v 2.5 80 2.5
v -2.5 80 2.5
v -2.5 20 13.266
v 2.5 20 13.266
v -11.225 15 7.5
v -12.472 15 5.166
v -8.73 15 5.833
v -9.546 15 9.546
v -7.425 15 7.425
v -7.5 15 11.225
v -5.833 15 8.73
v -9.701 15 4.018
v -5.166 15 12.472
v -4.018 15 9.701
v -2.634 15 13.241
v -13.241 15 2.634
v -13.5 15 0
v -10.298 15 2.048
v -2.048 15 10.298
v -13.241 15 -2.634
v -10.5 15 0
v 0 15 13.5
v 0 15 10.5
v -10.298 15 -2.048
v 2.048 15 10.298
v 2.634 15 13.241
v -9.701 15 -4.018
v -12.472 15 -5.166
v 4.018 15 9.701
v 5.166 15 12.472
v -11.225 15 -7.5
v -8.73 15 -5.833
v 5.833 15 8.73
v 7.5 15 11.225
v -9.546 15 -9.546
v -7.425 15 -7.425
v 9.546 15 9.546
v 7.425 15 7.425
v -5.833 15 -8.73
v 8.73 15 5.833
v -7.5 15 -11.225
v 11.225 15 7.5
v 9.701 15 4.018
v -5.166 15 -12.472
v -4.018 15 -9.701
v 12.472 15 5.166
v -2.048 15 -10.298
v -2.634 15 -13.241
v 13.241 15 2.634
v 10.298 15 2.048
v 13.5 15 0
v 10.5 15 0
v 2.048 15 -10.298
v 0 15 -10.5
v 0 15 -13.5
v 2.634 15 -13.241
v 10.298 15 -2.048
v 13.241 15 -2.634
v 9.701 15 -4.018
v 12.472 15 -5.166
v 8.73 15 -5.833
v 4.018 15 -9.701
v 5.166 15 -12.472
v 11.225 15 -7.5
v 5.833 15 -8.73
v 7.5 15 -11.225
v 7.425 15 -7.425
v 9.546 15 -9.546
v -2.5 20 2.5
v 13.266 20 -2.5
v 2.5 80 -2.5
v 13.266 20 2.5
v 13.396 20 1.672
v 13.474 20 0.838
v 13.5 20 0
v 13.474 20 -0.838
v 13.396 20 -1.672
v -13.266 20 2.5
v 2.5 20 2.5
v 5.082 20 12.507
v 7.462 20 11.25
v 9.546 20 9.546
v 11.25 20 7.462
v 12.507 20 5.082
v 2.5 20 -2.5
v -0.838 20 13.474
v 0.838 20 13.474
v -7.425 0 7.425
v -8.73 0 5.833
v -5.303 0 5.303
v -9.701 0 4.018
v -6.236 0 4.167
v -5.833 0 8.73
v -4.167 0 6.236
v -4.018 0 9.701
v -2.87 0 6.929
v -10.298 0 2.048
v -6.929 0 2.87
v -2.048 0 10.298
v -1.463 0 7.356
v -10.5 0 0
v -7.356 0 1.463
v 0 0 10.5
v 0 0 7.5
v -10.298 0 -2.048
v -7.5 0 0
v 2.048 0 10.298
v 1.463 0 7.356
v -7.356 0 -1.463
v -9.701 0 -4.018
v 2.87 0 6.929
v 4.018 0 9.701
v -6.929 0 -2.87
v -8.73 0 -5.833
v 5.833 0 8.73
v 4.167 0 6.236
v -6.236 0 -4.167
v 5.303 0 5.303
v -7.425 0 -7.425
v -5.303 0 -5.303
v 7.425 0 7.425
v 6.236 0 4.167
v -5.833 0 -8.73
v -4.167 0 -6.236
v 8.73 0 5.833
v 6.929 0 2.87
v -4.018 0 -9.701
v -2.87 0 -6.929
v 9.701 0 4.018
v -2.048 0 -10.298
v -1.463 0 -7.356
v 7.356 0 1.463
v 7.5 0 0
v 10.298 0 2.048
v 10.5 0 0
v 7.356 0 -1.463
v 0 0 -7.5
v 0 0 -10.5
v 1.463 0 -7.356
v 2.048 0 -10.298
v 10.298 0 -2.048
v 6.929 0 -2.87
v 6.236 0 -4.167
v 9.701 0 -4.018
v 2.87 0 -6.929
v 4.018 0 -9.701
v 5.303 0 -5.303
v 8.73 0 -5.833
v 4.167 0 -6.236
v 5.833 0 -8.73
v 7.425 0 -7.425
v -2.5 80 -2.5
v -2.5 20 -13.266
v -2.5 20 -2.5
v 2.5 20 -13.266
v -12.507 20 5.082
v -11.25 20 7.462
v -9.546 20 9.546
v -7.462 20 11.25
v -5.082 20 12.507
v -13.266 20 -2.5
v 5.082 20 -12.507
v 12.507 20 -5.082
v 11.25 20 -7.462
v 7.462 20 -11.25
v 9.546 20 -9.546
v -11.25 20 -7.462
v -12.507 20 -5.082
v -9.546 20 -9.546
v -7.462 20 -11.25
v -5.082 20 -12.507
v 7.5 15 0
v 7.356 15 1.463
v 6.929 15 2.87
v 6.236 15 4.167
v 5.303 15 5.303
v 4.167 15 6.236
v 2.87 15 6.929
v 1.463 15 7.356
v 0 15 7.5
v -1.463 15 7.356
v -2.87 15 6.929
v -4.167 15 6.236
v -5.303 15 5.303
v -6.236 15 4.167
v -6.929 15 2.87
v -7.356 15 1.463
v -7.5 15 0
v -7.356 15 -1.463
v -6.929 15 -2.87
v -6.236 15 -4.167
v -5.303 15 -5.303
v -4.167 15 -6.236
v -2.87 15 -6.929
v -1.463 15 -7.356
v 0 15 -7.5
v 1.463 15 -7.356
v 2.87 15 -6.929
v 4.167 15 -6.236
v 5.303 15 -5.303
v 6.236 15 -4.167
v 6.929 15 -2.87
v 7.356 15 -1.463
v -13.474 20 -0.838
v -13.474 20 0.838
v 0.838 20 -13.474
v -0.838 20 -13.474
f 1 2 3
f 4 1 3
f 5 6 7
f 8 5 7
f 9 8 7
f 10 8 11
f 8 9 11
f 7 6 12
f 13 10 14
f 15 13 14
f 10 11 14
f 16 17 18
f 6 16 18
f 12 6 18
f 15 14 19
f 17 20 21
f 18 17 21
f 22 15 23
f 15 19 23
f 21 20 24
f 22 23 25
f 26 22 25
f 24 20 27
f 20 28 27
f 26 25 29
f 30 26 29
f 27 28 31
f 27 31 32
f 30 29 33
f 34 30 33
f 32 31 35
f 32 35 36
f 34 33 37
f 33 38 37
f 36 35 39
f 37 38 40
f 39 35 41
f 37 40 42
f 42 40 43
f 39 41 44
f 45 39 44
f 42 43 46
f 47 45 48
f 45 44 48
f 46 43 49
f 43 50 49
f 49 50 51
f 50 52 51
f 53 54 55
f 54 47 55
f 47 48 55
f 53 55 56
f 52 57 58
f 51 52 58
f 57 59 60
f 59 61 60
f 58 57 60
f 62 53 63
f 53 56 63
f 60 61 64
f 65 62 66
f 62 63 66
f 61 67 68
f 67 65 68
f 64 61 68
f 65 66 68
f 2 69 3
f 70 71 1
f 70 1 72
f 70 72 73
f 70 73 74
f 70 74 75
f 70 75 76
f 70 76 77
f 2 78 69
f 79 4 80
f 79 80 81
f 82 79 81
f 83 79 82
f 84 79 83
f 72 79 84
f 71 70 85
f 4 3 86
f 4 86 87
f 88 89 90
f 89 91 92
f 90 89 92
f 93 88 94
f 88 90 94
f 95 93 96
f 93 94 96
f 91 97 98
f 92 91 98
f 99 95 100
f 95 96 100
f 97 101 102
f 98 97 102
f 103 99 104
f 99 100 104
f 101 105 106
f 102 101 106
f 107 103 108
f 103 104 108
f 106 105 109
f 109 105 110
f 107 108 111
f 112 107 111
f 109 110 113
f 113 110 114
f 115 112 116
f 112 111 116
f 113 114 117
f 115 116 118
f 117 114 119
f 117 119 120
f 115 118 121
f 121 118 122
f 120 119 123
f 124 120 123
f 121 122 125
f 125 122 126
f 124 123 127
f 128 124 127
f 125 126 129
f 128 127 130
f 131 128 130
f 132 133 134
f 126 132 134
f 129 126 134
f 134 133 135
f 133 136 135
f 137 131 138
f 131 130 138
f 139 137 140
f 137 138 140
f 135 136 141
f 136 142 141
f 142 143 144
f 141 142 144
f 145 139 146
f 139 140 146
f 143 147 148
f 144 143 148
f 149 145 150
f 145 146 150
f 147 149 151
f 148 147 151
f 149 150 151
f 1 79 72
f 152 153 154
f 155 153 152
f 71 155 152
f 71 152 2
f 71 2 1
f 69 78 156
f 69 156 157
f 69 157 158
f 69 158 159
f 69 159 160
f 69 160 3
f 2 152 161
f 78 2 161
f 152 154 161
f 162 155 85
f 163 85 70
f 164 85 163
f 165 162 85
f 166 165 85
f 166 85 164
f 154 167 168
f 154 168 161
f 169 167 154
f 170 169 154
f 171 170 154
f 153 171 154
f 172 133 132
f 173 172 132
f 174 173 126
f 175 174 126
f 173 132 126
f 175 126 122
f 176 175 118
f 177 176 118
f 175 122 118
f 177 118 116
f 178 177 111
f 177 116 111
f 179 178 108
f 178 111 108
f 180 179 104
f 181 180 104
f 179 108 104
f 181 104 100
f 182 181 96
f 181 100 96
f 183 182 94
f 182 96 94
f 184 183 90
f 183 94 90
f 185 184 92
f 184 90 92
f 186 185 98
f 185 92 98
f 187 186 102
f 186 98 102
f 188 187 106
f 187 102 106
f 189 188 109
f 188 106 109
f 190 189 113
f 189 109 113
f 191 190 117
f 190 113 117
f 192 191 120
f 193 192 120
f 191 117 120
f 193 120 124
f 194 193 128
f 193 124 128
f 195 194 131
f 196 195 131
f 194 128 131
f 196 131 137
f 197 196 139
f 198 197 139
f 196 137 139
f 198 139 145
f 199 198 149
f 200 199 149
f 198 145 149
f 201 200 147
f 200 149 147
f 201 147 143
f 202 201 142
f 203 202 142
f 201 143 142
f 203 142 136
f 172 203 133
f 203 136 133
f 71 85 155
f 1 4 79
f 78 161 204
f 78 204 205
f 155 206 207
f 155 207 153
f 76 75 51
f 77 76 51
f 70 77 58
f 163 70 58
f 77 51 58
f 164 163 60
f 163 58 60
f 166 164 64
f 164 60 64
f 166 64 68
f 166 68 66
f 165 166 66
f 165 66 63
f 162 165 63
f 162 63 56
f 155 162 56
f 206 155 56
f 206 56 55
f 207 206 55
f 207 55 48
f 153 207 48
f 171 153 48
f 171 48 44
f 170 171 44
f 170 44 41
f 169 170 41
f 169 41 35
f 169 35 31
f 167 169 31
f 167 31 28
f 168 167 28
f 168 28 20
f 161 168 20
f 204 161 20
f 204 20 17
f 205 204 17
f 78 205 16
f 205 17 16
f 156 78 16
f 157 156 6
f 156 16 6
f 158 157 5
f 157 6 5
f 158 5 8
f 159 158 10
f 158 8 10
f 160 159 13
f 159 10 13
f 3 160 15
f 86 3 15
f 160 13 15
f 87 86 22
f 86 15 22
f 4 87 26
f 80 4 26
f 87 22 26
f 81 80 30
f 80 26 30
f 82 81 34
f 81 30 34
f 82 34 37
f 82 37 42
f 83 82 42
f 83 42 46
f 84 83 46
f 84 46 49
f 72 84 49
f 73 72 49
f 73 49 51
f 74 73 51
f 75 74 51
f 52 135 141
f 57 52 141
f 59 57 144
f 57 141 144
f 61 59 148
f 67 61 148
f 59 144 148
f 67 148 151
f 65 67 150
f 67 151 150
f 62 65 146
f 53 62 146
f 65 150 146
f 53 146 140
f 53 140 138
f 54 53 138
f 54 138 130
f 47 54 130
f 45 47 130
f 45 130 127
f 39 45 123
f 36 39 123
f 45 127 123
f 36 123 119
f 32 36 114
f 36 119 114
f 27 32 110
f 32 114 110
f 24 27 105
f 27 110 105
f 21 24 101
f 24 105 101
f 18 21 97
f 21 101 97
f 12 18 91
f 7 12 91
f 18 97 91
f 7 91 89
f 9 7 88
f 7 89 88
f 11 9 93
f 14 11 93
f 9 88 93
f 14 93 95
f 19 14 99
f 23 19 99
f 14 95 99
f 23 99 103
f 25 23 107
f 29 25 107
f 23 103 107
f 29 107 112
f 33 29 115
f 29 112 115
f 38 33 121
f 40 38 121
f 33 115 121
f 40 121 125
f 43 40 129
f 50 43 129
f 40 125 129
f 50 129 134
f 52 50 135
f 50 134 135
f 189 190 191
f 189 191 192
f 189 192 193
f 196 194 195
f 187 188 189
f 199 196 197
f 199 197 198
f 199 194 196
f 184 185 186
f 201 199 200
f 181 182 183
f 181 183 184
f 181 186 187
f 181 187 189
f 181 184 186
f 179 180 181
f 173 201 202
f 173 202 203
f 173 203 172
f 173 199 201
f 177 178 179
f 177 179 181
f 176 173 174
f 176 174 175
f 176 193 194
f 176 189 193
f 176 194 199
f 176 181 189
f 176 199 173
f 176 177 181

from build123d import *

# Parameters (mm, degrees)
SKETCH1_R           = 10.5
BOSS_EXTRUDE1_DEPTH = 15
SKETCH6_R           = 13.5
BOSS_EXTRUDE4_DEPTH = 5
BOSS_EXTRUDE6_DEPTH = 60
SKETCH10_R          = 7.5
CUT_EXTRUDE5_DEPTH  = 15
CUT_EXTRUDE6_REACH  = 18
CUT_EXTRUDE7_REACH  = 18


with BuildPart() as part:
    # Sketch1 → Boss-Extrude1 (new body)
    with BuildSketch(Plane(origin=(0, 0, 0), x_dir=(1, 0, 0), z_dir=(0, 1, 0))):
        Circle(SKETCH1_R)
    extrude(amount=BOSS_EXTRUDE1_DEPTH)

    # Sketch6 → Boss-Extrude4 (add)
    with BuildSketch(Plane(origin=(0, 15, 0), x_dir=(1, 0, 0), z_dir=(0, 1, 0))):
        Circle(SKETCH6_R)
    extrude(amount=BOSS_EXTRUDE4_DEPTH)

    # Sketch12 → Boss-Extrude6 (add)
    with BuildSketch(Plane(origin=(0, 20, 0), x_dir=(1, 0, 0), z_dir=(0, 1, 0))):
        Polygon((2.5, -2.5), (13.266499161, -2.5), (13.266499161, 2.5), (2.5, 2.5), (2.5, 13.266499161), (-2.5, 13.266499161), (-2.5, 2.5), (-13.266499161, 2.5), (-13.266499161, -2.5), (-2.5, -2.5), (-2.5, -13.266499161), (2.5, -13.266499161), align=None)
    extrude(amount=BOSS_EXTRUDE6_DEPTH)

    # Sketch10 → Cut-Extrude5 (cut)
    with BuildSketch(Plane.XZ):
        Circle(SKETCH10_R)
    extrude(amount=-CUT_EXTRUDE5_DEPTH, mode=Mode.SUBTRACT)

    # Sketch17 → Cut-Extrude6 (cut, up to next)
    with BuildSketch(Plane.ZY.offset(2.5), mode=Mode.PRIVATE) as cut_extrude6_sk1:
        Polygon((-13.266499161, 80), (-13.266499161, 20), (-2.5, 80), align=None)
    cut_extrude6_tool1 = extrude(cut_extrude6_sk1.sketch, amount=-CUT_EXTRUDE6_REACH, mode=Mode.PRIVATE) & part.part
    add(cut_extrude6_tool1.solids().sort_by_distance((-2.5, 60, -9.677666))[0], mode=Mode.SUBTRACT)
    # Sketch17 → Cut-Extrude6 (cut, up to next)
    with BuildSketch(Plane.ZY.offset(2.5), mode=Mode.PRIVATE) as cut_extrude6_sk2:
        Polygon((2.5, 80), (13.266499161, 20), (13.266499161, 80), align=None)
    cut_extrude6_tool2 = extrude(cut_extrude6_sk2.sketch, amount=-CUT_EXTRUDE6_REACH, mode=Mode.PRIVATE) & part.part
    add(cut_extrude6_tool2.solids().sort_by_distance((-2.5, 60, 9.677666))[0], mode=Mode.SUBTRACT)

    # Sketch18 → Cut-Extrude7 (cut, up to next)
    with BuildSketch(Plane(origin=(0, 0, -2.5), x_dir=(-1, 0, 0), z_dir=(0, 0, -1)), mode=Mode.PRIVATE) as cut_extrude7_sk1:
        Polygon((2.5, 80), (13.266499161, 20), (13.266499161, 66.486374955), (13.266499161, 80), align=None)
    cut_extrude7_tool1 = extrude(cut_extrude7_sk1.sketch, amount=-CUT_EXTRUDE7_REACH, mode=Mode.PRIVATE) & part.part
    add(cut_extrude7_tool1.solids().sort_by_distance((-9.677666, 60, -2.5))[0], mode=Mode.SUBTRACT)
    # Sketch18 → Cut-Extrude7 (cut, up to next)
    with BuildSketch(Plane(origin=(0, 0, -2.5), x_dir=(-1, 0, 0), z_dir=(0, 0, -1)), mode=Mode.PRIVATE) as cut_extrude7_sk2:
        Polygon((-2.5, 80), (-13.266499161, 20), (-13.266499161, 80), align=None)
    cut_extrude7_tool2 = extrude(cut_extrude7_sk2.sketch, amount=-CUT_EXTRUDE7_REACH, mode=Mode.PRIVATE) & part.part
    add(cut_extrude7_tool2.solids().sort_by_distance((9.677666, 60, -2.5))[0], mode=Mode.SUBTRACT)


solid = part.part
